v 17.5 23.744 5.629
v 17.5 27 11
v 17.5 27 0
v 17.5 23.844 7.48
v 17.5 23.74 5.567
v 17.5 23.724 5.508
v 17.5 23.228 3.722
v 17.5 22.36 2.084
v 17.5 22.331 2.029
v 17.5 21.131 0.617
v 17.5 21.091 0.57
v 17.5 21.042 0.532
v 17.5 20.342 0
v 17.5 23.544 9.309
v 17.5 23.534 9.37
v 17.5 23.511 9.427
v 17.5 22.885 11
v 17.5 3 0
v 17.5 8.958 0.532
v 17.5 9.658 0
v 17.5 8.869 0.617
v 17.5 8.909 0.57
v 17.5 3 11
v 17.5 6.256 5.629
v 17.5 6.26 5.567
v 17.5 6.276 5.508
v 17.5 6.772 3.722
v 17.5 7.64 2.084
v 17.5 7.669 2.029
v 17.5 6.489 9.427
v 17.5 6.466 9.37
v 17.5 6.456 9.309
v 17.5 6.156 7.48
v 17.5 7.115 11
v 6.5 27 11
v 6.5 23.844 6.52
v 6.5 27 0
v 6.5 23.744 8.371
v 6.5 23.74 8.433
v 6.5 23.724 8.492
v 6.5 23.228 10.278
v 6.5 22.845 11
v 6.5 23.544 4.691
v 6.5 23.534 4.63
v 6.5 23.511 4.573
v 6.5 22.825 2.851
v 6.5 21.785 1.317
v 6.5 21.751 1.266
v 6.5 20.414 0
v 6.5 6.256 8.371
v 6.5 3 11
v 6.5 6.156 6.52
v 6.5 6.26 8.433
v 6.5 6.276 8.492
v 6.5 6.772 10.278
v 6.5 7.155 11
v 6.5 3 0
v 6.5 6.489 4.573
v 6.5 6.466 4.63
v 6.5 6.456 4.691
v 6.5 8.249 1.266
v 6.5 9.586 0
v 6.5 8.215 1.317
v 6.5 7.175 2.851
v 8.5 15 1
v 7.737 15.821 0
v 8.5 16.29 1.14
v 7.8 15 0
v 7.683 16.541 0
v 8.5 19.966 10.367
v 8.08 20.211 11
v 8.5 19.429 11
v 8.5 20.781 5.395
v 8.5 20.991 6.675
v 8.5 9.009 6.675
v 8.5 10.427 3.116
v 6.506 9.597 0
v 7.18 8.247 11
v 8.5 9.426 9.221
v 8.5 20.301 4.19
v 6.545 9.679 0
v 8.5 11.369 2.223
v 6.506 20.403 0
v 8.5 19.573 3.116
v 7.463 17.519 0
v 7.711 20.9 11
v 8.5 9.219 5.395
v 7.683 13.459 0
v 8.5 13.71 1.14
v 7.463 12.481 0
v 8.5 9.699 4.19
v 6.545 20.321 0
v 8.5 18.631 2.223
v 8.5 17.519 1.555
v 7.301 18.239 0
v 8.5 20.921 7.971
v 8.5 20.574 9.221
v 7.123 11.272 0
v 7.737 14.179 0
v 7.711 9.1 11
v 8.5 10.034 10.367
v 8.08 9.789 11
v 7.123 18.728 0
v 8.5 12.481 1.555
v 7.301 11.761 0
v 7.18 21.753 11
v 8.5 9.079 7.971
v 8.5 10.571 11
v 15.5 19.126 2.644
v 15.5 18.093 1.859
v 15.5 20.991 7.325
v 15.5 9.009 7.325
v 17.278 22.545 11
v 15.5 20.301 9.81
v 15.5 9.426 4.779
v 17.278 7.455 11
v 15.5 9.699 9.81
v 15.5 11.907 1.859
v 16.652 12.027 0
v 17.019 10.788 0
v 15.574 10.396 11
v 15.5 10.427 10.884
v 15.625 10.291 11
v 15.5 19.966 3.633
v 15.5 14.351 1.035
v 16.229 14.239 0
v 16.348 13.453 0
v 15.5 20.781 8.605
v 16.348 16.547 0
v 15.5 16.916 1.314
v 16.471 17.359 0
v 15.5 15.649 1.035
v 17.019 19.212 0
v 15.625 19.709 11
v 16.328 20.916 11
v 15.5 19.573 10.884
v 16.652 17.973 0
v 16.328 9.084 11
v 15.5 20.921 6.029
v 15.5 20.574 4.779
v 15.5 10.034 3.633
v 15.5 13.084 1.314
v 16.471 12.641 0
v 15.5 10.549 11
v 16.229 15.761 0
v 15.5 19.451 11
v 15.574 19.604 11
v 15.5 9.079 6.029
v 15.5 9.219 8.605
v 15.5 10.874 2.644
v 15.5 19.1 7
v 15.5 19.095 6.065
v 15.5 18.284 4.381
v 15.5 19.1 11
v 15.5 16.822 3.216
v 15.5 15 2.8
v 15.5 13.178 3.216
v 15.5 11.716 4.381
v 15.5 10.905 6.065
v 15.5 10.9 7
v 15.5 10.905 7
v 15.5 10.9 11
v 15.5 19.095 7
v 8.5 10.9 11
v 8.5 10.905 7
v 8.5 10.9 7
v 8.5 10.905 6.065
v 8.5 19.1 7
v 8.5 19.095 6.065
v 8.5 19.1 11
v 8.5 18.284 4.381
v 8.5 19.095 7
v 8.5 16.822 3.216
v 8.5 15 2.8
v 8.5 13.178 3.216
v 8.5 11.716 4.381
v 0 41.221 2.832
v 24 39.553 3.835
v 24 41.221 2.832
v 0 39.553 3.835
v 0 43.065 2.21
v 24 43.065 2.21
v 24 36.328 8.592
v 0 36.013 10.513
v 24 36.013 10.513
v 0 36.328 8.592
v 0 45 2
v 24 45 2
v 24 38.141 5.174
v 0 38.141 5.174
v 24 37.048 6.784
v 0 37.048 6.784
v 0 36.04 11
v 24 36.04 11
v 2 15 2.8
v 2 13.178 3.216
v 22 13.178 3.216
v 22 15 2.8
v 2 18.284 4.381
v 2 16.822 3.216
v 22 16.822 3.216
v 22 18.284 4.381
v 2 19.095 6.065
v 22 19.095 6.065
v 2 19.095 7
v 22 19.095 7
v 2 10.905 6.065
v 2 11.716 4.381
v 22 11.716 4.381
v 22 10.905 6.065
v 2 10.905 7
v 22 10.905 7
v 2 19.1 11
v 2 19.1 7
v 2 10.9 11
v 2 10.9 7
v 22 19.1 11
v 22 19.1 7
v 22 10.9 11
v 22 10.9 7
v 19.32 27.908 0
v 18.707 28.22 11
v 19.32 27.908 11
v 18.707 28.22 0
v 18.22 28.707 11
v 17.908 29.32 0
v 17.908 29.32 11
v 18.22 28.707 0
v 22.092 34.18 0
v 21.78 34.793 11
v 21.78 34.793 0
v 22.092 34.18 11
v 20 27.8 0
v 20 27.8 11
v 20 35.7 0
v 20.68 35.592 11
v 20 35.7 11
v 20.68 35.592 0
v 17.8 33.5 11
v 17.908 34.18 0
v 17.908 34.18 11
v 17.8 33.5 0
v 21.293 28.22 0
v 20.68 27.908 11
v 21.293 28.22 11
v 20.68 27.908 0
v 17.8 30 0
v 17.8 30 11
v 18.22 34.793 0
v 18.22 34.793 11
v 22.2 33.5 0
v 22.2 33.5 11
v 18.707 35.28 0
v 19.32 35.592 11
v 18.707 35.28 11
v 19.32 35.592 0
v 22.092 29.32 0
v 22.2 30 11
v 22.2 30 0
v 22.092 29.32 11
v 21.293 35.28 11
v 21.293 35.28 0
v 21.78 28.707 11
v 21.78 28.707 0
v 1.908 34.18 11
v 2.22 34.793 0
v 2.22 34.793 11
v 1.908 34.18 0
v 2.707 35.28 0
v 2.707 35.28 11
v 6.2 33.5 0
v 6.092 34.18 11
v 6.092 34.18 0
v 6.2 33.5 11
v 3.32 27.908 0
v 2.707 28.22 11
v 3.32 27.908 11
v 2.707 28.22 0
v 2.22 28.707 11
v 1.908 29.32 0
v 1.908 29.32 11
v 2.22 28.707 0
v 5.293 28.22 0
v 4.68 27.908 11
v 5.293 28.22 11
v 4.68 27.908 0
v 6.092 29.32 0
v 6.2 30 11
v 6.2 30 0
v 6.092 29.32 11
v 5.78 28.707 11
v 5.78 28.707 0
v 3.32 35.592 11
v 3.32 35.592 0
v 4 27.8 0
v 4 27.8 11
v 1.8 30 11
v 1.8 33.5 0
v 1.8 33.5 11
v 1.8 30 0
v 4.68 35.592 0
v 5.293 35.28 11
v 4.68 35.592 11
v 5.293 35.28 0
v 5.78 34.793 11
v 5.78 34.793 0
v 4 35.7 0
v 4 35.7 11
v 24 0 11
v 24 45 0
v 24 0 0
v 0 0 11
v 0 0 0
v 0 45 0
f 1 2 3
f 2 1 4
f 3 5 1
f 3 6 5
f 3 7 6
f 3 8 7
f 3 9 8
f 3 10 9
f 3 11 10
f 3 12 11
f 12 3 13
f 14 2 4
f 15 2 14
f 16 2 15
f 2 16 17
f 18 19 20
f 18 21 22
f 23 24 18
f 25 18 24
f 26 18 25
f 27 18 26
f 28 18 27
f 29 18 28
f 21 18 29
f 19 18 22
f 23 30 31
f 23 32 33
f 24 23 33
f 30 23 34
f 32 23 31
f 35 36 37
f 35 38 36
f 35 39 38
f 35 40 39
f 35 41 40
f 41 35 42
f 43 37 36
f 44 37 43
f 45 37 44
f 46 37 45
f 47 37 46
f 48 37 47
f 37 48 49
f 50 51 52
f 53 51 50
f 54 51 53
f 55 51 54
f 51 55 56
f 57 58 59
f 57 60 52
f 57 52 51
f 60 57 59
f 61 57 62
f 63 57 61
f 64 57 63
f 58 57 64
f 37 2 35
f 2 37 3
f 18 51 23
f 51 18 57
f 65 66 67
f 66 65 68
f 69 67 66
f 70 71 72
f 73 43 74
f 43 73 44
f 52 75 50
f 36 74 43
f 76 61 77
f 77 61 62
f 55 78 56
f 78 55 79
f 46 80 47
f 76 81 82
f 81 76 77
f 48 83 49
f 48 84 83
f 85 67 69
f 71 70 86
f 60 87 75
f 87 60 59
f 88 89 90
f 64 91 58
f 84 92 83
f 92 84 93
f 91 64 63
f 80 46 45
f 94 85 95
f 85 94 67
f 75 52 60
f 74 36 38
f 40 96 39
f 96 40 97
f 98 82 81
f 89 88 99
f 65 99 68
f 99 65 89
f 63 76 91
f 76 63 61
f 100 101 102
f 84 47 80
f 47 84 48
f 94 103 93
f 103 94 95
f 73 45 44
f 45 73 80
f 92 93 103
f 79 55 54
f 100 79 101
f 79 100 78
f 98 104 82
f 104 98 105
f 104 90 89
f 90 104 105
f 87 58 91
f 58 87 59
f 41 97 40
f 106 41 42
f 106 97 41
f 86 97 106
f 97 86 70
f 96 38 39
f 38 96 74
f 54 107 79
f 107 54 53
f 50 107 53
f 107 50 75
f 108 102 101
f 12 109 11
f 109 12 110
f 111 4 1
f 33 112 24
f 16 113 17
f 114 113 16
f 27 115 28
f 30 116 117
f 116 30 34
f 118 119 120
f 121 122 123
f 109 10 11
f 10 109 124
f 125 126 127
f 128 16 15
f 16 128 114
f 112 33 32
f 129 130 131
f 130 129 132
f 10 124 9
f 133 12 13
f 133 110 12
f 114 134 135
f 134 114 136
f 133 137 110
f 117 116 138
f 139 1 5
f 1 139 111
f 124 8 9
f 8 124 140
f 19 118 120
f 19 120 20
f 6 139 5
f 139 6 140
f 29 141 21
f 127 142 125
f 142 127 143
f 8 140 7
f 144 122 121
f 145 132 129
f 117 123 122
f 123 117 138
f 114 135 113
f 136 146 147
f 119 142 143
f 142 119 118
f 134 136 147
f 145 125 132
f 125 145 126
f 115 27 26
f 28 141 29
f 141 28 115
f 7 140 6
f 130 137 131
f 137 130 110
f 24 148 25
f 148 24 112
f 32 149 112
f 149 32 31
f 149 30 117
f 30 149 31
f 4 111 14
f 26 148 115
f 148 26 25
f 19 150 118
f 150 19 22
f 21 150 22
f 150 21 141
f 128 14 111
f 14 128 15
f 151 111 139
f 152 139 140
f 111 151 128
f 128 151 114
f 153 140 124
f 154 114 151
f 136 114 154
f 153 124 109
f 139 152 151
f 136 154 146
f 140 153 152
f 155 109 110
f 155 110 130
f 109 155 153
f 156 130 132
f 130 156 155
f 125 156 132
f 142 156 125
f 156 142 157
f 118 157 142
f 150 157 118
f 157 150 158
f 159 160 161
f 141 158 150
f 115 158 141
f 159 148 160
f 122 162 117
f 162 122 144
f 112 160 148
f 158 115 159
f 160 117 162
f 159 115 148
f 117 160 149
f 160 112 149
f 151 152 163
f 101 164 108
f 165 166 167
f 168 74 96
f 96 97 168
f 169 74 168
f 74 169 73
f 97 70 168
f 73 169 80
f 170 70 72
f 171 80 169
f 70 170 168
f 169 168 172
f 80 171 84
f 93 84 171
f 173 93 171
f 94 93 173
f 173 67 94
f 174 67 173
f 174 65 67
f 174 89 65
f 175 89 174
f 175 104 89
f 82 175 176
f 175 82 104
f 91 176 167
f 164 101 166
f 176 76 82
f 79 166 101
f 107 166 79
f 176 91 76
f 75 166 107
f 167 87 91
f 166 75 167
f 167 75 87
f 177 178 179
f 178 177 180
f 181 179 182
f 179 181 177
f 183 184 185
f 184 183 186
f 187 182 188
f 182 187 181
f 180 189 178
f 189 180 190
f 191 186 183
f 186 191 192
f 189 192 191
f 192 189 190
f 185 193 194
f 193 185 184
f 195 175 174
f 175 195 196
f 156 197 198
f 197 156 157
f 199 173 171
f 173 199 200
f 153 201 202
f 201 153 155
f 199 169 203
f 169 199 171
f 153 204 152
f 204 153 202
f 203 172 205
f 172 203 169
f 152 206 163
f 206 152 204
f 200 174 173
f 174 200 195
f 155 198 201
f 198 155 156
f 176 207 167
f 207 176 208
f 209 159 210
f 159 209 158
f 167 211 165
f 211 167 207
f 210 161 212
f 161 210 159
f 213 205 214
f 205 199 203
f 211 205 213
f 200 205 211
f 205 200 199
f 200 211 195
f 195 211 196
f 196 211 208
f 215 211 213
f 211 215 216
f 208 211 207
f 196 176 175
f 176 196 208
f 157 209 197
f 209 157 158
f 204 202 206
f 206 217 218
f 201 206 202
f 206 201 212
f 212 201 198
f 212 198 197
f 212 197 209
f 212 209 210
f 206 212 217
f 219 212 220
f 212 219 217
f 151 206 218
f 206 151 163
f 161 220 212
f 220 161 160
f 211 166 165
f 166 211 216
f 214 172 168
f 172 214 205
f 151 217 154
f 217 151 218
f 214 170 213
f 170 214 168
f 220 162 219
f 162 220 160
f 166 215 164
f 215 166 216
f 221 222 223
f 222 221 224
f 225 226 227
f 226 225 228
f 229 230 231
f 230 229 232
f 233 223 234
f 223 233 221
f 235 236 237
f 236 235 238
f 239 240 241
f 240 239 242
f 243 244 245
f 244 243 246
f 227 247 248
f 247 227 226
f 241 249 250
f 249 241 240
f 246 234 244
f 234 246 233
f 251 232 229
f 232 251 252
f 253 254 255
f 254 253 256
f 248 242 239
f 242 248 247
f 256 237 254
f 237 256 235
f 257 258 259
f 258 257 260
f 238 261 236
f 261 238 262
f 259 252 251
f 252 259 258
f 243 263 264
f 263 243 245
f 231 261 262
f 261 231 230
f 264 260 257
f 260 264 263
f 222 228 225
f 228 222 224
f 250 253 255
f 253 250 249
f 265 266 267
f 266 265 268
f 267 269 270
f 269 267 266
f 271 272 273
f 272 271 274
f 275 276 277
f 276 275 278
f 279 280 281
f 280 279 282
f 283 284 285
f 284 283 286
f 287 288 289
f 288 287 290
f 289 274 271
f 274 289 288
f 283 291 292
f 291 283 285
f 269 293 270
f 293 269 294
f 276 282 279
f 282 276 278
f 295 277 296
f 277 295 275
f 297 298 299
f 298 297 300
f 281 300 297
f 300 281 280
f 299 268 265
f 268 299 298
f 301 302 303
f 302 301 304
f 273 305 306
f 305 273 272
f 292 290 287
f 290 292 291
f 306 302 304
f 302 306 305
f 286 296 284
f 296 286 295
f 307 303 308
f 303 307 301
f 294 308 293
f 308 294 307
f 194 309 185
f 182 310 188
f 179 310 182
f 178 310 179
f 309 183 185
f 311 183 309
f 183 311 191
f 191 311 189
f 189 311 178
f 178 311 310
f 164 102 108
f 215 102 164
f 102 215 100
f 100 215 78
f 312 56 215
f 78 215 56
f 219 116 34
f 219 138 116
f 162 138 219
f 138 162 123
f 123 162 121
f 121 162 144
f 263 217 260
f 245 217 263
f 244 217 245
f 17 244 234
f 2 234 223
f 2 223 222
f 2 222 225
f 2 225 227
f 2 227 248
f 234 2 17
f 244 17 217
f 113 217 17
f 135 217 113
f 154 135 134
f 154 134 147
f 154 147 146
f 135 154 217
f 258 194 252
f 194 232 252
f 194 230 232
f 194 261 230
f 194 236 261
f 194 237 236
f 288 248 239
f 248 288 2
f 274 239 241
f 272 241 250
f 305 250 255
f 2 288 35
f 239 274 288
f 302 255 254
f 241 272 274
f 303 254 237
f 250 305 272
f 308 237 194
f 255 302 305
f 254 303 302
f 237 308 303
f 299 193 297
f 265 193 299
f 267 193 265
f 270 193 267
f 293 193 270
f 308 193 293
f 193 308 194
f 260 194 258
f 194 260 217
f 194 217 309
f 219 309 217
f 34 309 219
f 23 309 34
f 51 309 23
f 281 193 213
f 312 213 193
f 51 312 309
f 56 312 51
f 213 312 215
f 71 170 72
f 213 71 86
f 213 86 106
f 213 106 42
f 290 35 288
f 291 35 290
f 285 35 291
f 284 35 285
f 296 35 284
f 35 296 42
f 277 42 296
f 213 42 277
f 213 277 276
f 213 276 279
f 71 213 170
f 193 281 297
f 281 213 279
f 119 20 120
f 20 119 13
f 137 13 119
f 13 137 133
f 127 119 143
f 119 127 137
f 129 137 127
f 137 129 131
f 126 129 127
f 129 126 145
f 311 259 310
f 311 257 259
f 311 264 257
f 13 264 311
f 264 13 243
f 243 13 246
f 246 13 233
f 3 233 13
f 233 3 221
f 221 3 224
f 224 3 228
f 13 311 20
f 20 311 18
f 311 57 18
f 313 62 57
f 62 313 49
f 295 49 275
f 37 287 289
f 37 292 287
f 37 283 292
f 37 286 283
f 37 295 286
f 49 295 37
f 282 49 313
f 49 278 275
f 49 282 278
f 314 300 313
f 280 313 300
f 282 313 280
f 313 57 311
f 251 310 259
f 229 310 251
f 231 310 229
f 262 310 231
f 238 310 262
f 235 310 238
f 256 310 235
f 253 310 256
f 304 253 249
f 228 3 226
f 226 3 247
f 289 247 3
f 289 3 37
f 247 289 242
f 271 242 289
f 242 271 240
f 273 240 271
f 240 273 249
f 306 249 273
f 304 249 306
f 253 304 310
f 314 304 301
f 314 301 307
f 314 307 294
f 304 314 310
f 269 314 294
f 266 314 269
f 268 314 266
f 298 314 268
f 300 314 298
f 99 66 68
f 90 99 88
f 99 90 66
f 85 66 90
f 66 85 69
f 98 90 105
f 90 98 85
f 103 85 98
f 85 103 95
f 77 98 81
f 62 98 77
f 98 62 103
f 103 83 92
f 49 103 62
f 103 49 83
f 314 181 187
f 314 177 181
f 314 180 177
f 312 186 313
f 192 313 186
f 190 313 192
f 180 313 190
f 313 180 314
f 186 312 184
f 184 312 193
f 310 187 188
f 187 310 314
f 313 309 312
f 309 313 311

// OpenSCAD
// RebeliX
//
// extruder idler
// GNU GPL v3
// Martin Neruda <neruda@reprap4u.cz>
// http://www.reprap4u.cz
// Inspired by Prusa i3


module extruder_idler_base(){
 translate([0,0,0]) cube([24,45,8+3]);
}

module extruder_idler_holes(){
 translate([12,15,0]){
  // Main cutout
  difference(){
  cube([11,24,25], center= true);
  translate([-5.6,0,11-4])rotate([0,90,0])cylinder(r1=9,r2=6, h=2.1);
  translate([5.6,0,11-4])rotate([0,-90,0])cylinder(r1=9,r2=6, h=2.1);
  }
  cube([7,24,25], center= true);
  // Vyrez pro odklopeni
  translate([-12.1,30,11]) rotate([0,90,0]) cylinder(r=9,h=25); 
  
  // Idler shaft
  translate([-10,0,11-4])rotate([0,90,0])cylinder(r=4.2, h=20);
  translate([-10,-4.1,11-4]) cube([20,8.2,6]);
  // Screw holes
	hull(){
  	translate([8,18.5,-1])cylinder(r=2.2, h=24, $fn=20);
  	translate([8,15,-1])cylinder(r=2.2, h=24, $fn=20);
	}

	hull(){
  	translate([-8,18.5,-1])cylinder(r=2.2, h=24, $fn=20);
  	translate([-8,15,-1])cylinder(r=2.2, h=24, $fn=20);
	}
 }
}


// Idler final part
module idler(){
 difference(){
  extruder_idler_base();
  extruder_idler_holes();
 }
}

idler();
